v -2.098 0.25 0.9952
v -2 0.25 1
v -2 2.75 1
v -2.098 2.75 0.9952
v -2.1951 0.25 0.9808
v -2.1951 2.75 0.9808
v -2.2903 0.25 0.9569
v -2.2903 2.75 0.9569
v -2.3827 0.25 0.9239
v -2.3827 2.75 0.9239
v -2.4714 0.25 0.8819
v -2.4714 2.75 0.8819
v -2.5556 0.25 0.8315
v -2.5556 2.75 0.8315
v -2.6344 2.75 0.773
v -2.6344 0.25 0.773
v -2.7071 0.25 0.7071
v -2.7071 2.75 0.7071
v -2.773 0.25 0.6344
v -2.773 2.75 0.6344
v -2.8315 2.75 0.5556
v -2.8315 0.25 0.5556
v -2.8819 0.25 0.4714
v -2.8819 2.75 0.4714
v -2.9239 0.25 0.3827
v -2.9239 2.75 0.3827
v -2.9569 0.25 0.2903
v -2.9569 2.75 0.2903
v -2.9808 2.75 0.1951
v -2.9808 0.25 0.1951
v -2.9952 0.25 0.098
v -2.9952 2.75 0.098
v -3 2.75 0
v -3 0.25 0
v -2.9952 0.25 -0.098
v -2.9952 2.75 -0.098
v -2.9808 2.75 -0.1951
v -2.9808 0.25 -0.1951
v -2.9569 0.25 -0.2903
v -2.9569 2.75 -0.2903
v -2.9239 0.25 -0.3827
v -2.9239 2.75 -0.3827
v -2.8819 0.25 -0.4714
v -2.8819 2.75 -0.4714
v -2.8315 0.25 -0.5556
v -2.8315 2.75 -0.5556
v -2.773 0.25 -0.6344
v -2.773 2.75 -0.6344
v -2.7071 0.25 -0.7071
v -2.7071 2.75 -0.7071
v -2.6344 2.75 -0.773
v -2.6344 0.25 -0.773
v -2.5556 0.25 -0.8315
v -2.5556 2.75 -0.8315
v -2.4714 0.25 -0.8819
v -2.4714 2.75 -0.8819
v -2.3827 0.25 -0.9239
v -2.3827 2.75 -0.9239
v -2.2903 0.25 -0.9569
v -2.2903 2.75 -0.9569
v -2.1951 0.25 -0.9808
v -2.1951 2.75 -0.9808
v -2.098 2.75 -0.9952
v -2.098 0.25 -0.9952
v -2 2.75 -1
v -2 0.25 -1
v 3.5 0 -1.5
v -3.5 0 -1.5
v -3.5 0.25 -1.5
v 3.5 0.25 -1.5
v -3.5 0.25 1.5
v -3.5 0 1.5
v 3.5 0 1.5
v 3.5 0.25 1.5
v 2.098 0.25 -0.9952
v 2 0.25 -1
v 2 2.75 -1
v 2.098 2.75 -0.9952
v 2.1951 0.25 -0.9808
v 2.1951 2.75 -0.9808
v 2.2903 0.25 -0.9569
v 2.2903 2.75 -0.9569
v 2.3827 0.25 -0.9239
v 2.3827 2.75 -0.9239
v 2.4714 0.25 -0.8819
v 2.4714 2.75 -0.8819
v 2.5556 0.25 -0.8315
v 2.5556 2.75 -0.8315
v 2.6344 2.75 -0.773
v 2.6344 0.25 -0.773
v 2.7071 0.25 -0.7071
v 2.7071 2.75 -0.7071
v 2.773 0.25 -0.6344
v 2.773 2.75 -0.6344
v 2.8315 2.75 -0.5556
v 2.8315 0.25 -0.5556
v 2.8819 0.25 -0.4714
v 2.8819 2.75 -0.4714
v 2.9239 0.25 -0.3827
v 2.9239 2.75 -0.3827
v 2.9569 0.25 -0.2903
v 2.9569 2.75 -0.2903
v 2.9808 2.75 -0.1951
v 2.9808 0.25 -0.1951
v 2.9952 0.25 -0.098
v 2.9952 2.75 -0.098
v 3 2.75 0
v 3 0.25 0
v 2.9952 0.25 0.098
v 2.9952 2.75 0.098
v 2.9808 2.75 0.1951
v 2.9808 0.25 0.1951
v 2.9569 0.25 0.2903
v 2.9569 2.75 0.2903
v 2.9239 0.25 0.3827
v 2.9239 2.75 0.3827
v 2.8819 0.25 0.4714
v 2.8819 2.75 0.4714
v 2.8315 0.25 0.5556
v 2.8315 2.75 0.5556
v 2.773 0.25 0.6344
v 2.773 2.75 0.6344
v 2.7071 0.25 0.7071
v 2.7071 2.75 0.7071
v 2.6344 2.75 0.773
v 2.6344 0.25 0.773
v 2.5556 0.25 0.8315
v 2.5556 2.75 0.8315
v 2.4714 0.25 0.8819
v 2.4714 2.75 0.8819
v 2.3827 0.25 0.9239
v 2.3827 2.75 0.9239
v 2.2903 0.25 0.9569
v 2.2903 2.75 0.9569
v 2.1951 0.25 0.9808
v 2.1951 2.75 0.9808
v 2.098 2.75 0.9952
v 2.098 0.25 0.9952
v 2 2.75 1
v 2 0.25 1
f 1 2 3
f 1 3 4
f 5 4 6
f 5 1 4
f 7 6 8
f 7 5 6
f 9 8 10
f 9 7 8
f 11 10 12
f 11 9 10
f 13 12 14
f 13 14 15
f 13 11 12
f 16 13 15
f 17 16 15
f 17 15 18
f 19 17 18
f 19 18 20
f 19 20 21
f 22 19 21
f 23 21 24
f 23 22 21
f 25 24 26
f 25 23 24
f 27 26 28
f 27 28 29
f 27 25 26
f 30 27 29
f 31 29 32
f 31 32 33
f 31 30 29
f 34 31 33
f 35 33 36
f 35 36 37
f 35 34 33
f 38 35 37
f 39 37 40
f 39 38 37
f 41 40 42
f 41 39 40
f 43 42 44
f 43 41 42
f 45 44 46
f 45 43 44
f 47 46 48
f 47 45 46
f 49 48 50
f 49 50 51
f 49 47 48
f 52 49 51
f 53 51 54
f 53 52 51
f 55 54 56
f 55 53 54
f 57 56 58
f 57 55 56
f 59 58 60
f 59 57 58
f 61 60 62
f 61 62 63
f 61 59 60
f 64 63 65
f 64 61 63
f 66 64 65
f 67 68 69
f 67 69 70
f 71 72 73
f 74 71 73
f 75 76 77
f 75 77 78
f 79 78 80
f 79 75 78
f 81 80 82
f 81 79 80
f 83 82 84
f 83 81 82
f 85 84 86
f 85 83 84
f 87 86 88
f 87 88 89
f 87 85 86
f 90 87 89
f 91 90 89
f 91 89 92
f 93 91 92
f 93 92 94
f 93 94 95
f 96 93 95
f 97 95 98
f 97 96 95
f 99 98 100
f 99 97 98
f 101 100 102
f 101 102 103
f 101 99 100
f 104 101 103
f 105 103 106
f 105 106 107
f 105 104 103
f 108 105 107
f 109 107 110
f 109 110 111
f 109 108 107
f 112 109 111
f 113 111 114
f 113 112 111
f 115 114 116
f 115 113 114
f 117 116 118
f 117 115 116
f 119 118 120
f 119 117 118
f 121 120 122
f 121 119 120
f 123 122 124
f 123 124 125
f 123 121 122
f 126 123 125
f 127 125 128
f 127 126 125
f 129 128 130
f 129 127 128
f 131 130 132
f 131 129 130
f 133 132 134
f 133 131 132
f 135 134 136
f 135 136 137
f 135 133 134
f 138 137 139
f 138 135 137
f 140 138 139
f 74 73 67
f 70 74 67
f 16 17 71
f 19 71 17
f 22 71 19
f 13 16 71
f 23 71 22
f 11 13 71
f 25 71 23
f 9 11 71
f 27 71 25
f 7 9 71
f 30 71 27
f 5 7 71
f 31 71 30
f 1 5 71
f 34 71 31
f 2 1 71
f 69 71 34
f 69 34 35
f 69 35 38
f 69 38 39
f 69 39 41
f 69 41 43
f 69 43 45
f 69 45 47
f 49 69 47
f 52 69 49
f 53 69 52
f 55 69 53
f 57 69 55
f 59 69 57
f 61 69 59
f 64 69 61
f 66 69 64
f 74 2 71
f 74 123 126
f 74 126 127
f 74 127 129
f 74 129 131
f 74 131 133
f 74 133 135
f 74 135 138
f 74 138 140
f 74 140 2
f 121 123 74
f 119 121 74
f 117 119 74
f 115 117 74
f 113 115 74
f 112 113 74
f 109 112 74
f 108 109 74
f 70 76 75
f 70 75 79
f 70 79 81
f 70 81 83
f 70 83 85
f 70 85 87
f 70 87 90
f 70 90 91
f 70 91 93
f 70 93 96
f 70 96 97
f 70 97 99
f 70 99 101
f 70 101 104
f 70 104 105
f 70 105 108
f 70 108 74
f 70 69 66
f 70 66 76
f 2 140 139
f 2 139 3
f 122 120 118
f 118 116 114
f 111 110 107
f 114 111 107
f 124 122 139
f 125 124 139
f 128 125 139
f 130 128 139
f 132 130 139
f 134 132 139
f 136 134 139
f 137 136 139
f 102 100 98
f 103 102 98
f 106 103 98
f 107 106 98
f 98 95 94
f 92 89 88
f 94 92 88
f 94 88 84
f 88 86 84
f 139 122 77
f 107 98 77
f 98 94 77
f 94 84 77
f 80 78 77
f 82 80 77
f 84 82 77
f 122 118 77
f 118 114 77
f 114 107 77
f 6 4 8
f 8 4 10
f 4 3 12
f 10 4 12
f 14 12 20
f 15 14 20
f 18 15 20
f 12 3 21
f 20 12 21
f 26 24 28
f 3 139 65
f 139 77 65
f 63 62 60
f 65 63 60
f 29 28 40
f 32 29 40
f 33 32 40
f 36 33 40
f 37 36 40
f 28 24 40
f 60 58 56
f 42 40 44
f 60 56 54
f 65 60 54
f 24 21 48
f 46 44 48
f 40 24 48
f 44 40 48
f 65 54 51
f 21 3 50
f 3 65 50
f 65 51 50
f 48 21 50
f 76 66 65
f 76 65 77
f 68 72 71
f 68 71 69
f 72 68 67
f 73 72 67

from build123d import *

# Parameters (mm, degrees)
SKETCH1_W           = 7
SKETCH1_H           = 3
BOSS_EXTRUDE1_DEPTH = 0.25
BOSS_EXTRUDE2_DEPTH = 2.5


with BuildPart() as part:
    # Sketch1 → Boss-Extrude1 (new body)
    with BuildSketch(Plane(origin=(0, 0, 0), x_dir=(1, 0, 0), z_dir=(0, 1, 0))):
        Rectangle(SKETCH1_W, SKETCH1_H)
    extrude(amount=BOSS_EXTRUDE1_DEPTH)

    # Sketch2 → Boss-Extrude2 (add)
    with BuildSketch(Plane(origin=(0, 0.25, 0), x_dir=(1, 0, 0), z_dir=(0, 1, 0))):
        with BuildLine():
            Line((2, -1), (-2, -1))
            ThreePointArc((-2, -1), (-3, 0), (-2, 1))
            Line((-2, 1), (2, 1))
            ThreePointArc((2, 1), (3, 0), (2, -1))
        make_face()
    extrude(amount=BOSS_EXTRUDE2_DEPTH)


solid = part.part
